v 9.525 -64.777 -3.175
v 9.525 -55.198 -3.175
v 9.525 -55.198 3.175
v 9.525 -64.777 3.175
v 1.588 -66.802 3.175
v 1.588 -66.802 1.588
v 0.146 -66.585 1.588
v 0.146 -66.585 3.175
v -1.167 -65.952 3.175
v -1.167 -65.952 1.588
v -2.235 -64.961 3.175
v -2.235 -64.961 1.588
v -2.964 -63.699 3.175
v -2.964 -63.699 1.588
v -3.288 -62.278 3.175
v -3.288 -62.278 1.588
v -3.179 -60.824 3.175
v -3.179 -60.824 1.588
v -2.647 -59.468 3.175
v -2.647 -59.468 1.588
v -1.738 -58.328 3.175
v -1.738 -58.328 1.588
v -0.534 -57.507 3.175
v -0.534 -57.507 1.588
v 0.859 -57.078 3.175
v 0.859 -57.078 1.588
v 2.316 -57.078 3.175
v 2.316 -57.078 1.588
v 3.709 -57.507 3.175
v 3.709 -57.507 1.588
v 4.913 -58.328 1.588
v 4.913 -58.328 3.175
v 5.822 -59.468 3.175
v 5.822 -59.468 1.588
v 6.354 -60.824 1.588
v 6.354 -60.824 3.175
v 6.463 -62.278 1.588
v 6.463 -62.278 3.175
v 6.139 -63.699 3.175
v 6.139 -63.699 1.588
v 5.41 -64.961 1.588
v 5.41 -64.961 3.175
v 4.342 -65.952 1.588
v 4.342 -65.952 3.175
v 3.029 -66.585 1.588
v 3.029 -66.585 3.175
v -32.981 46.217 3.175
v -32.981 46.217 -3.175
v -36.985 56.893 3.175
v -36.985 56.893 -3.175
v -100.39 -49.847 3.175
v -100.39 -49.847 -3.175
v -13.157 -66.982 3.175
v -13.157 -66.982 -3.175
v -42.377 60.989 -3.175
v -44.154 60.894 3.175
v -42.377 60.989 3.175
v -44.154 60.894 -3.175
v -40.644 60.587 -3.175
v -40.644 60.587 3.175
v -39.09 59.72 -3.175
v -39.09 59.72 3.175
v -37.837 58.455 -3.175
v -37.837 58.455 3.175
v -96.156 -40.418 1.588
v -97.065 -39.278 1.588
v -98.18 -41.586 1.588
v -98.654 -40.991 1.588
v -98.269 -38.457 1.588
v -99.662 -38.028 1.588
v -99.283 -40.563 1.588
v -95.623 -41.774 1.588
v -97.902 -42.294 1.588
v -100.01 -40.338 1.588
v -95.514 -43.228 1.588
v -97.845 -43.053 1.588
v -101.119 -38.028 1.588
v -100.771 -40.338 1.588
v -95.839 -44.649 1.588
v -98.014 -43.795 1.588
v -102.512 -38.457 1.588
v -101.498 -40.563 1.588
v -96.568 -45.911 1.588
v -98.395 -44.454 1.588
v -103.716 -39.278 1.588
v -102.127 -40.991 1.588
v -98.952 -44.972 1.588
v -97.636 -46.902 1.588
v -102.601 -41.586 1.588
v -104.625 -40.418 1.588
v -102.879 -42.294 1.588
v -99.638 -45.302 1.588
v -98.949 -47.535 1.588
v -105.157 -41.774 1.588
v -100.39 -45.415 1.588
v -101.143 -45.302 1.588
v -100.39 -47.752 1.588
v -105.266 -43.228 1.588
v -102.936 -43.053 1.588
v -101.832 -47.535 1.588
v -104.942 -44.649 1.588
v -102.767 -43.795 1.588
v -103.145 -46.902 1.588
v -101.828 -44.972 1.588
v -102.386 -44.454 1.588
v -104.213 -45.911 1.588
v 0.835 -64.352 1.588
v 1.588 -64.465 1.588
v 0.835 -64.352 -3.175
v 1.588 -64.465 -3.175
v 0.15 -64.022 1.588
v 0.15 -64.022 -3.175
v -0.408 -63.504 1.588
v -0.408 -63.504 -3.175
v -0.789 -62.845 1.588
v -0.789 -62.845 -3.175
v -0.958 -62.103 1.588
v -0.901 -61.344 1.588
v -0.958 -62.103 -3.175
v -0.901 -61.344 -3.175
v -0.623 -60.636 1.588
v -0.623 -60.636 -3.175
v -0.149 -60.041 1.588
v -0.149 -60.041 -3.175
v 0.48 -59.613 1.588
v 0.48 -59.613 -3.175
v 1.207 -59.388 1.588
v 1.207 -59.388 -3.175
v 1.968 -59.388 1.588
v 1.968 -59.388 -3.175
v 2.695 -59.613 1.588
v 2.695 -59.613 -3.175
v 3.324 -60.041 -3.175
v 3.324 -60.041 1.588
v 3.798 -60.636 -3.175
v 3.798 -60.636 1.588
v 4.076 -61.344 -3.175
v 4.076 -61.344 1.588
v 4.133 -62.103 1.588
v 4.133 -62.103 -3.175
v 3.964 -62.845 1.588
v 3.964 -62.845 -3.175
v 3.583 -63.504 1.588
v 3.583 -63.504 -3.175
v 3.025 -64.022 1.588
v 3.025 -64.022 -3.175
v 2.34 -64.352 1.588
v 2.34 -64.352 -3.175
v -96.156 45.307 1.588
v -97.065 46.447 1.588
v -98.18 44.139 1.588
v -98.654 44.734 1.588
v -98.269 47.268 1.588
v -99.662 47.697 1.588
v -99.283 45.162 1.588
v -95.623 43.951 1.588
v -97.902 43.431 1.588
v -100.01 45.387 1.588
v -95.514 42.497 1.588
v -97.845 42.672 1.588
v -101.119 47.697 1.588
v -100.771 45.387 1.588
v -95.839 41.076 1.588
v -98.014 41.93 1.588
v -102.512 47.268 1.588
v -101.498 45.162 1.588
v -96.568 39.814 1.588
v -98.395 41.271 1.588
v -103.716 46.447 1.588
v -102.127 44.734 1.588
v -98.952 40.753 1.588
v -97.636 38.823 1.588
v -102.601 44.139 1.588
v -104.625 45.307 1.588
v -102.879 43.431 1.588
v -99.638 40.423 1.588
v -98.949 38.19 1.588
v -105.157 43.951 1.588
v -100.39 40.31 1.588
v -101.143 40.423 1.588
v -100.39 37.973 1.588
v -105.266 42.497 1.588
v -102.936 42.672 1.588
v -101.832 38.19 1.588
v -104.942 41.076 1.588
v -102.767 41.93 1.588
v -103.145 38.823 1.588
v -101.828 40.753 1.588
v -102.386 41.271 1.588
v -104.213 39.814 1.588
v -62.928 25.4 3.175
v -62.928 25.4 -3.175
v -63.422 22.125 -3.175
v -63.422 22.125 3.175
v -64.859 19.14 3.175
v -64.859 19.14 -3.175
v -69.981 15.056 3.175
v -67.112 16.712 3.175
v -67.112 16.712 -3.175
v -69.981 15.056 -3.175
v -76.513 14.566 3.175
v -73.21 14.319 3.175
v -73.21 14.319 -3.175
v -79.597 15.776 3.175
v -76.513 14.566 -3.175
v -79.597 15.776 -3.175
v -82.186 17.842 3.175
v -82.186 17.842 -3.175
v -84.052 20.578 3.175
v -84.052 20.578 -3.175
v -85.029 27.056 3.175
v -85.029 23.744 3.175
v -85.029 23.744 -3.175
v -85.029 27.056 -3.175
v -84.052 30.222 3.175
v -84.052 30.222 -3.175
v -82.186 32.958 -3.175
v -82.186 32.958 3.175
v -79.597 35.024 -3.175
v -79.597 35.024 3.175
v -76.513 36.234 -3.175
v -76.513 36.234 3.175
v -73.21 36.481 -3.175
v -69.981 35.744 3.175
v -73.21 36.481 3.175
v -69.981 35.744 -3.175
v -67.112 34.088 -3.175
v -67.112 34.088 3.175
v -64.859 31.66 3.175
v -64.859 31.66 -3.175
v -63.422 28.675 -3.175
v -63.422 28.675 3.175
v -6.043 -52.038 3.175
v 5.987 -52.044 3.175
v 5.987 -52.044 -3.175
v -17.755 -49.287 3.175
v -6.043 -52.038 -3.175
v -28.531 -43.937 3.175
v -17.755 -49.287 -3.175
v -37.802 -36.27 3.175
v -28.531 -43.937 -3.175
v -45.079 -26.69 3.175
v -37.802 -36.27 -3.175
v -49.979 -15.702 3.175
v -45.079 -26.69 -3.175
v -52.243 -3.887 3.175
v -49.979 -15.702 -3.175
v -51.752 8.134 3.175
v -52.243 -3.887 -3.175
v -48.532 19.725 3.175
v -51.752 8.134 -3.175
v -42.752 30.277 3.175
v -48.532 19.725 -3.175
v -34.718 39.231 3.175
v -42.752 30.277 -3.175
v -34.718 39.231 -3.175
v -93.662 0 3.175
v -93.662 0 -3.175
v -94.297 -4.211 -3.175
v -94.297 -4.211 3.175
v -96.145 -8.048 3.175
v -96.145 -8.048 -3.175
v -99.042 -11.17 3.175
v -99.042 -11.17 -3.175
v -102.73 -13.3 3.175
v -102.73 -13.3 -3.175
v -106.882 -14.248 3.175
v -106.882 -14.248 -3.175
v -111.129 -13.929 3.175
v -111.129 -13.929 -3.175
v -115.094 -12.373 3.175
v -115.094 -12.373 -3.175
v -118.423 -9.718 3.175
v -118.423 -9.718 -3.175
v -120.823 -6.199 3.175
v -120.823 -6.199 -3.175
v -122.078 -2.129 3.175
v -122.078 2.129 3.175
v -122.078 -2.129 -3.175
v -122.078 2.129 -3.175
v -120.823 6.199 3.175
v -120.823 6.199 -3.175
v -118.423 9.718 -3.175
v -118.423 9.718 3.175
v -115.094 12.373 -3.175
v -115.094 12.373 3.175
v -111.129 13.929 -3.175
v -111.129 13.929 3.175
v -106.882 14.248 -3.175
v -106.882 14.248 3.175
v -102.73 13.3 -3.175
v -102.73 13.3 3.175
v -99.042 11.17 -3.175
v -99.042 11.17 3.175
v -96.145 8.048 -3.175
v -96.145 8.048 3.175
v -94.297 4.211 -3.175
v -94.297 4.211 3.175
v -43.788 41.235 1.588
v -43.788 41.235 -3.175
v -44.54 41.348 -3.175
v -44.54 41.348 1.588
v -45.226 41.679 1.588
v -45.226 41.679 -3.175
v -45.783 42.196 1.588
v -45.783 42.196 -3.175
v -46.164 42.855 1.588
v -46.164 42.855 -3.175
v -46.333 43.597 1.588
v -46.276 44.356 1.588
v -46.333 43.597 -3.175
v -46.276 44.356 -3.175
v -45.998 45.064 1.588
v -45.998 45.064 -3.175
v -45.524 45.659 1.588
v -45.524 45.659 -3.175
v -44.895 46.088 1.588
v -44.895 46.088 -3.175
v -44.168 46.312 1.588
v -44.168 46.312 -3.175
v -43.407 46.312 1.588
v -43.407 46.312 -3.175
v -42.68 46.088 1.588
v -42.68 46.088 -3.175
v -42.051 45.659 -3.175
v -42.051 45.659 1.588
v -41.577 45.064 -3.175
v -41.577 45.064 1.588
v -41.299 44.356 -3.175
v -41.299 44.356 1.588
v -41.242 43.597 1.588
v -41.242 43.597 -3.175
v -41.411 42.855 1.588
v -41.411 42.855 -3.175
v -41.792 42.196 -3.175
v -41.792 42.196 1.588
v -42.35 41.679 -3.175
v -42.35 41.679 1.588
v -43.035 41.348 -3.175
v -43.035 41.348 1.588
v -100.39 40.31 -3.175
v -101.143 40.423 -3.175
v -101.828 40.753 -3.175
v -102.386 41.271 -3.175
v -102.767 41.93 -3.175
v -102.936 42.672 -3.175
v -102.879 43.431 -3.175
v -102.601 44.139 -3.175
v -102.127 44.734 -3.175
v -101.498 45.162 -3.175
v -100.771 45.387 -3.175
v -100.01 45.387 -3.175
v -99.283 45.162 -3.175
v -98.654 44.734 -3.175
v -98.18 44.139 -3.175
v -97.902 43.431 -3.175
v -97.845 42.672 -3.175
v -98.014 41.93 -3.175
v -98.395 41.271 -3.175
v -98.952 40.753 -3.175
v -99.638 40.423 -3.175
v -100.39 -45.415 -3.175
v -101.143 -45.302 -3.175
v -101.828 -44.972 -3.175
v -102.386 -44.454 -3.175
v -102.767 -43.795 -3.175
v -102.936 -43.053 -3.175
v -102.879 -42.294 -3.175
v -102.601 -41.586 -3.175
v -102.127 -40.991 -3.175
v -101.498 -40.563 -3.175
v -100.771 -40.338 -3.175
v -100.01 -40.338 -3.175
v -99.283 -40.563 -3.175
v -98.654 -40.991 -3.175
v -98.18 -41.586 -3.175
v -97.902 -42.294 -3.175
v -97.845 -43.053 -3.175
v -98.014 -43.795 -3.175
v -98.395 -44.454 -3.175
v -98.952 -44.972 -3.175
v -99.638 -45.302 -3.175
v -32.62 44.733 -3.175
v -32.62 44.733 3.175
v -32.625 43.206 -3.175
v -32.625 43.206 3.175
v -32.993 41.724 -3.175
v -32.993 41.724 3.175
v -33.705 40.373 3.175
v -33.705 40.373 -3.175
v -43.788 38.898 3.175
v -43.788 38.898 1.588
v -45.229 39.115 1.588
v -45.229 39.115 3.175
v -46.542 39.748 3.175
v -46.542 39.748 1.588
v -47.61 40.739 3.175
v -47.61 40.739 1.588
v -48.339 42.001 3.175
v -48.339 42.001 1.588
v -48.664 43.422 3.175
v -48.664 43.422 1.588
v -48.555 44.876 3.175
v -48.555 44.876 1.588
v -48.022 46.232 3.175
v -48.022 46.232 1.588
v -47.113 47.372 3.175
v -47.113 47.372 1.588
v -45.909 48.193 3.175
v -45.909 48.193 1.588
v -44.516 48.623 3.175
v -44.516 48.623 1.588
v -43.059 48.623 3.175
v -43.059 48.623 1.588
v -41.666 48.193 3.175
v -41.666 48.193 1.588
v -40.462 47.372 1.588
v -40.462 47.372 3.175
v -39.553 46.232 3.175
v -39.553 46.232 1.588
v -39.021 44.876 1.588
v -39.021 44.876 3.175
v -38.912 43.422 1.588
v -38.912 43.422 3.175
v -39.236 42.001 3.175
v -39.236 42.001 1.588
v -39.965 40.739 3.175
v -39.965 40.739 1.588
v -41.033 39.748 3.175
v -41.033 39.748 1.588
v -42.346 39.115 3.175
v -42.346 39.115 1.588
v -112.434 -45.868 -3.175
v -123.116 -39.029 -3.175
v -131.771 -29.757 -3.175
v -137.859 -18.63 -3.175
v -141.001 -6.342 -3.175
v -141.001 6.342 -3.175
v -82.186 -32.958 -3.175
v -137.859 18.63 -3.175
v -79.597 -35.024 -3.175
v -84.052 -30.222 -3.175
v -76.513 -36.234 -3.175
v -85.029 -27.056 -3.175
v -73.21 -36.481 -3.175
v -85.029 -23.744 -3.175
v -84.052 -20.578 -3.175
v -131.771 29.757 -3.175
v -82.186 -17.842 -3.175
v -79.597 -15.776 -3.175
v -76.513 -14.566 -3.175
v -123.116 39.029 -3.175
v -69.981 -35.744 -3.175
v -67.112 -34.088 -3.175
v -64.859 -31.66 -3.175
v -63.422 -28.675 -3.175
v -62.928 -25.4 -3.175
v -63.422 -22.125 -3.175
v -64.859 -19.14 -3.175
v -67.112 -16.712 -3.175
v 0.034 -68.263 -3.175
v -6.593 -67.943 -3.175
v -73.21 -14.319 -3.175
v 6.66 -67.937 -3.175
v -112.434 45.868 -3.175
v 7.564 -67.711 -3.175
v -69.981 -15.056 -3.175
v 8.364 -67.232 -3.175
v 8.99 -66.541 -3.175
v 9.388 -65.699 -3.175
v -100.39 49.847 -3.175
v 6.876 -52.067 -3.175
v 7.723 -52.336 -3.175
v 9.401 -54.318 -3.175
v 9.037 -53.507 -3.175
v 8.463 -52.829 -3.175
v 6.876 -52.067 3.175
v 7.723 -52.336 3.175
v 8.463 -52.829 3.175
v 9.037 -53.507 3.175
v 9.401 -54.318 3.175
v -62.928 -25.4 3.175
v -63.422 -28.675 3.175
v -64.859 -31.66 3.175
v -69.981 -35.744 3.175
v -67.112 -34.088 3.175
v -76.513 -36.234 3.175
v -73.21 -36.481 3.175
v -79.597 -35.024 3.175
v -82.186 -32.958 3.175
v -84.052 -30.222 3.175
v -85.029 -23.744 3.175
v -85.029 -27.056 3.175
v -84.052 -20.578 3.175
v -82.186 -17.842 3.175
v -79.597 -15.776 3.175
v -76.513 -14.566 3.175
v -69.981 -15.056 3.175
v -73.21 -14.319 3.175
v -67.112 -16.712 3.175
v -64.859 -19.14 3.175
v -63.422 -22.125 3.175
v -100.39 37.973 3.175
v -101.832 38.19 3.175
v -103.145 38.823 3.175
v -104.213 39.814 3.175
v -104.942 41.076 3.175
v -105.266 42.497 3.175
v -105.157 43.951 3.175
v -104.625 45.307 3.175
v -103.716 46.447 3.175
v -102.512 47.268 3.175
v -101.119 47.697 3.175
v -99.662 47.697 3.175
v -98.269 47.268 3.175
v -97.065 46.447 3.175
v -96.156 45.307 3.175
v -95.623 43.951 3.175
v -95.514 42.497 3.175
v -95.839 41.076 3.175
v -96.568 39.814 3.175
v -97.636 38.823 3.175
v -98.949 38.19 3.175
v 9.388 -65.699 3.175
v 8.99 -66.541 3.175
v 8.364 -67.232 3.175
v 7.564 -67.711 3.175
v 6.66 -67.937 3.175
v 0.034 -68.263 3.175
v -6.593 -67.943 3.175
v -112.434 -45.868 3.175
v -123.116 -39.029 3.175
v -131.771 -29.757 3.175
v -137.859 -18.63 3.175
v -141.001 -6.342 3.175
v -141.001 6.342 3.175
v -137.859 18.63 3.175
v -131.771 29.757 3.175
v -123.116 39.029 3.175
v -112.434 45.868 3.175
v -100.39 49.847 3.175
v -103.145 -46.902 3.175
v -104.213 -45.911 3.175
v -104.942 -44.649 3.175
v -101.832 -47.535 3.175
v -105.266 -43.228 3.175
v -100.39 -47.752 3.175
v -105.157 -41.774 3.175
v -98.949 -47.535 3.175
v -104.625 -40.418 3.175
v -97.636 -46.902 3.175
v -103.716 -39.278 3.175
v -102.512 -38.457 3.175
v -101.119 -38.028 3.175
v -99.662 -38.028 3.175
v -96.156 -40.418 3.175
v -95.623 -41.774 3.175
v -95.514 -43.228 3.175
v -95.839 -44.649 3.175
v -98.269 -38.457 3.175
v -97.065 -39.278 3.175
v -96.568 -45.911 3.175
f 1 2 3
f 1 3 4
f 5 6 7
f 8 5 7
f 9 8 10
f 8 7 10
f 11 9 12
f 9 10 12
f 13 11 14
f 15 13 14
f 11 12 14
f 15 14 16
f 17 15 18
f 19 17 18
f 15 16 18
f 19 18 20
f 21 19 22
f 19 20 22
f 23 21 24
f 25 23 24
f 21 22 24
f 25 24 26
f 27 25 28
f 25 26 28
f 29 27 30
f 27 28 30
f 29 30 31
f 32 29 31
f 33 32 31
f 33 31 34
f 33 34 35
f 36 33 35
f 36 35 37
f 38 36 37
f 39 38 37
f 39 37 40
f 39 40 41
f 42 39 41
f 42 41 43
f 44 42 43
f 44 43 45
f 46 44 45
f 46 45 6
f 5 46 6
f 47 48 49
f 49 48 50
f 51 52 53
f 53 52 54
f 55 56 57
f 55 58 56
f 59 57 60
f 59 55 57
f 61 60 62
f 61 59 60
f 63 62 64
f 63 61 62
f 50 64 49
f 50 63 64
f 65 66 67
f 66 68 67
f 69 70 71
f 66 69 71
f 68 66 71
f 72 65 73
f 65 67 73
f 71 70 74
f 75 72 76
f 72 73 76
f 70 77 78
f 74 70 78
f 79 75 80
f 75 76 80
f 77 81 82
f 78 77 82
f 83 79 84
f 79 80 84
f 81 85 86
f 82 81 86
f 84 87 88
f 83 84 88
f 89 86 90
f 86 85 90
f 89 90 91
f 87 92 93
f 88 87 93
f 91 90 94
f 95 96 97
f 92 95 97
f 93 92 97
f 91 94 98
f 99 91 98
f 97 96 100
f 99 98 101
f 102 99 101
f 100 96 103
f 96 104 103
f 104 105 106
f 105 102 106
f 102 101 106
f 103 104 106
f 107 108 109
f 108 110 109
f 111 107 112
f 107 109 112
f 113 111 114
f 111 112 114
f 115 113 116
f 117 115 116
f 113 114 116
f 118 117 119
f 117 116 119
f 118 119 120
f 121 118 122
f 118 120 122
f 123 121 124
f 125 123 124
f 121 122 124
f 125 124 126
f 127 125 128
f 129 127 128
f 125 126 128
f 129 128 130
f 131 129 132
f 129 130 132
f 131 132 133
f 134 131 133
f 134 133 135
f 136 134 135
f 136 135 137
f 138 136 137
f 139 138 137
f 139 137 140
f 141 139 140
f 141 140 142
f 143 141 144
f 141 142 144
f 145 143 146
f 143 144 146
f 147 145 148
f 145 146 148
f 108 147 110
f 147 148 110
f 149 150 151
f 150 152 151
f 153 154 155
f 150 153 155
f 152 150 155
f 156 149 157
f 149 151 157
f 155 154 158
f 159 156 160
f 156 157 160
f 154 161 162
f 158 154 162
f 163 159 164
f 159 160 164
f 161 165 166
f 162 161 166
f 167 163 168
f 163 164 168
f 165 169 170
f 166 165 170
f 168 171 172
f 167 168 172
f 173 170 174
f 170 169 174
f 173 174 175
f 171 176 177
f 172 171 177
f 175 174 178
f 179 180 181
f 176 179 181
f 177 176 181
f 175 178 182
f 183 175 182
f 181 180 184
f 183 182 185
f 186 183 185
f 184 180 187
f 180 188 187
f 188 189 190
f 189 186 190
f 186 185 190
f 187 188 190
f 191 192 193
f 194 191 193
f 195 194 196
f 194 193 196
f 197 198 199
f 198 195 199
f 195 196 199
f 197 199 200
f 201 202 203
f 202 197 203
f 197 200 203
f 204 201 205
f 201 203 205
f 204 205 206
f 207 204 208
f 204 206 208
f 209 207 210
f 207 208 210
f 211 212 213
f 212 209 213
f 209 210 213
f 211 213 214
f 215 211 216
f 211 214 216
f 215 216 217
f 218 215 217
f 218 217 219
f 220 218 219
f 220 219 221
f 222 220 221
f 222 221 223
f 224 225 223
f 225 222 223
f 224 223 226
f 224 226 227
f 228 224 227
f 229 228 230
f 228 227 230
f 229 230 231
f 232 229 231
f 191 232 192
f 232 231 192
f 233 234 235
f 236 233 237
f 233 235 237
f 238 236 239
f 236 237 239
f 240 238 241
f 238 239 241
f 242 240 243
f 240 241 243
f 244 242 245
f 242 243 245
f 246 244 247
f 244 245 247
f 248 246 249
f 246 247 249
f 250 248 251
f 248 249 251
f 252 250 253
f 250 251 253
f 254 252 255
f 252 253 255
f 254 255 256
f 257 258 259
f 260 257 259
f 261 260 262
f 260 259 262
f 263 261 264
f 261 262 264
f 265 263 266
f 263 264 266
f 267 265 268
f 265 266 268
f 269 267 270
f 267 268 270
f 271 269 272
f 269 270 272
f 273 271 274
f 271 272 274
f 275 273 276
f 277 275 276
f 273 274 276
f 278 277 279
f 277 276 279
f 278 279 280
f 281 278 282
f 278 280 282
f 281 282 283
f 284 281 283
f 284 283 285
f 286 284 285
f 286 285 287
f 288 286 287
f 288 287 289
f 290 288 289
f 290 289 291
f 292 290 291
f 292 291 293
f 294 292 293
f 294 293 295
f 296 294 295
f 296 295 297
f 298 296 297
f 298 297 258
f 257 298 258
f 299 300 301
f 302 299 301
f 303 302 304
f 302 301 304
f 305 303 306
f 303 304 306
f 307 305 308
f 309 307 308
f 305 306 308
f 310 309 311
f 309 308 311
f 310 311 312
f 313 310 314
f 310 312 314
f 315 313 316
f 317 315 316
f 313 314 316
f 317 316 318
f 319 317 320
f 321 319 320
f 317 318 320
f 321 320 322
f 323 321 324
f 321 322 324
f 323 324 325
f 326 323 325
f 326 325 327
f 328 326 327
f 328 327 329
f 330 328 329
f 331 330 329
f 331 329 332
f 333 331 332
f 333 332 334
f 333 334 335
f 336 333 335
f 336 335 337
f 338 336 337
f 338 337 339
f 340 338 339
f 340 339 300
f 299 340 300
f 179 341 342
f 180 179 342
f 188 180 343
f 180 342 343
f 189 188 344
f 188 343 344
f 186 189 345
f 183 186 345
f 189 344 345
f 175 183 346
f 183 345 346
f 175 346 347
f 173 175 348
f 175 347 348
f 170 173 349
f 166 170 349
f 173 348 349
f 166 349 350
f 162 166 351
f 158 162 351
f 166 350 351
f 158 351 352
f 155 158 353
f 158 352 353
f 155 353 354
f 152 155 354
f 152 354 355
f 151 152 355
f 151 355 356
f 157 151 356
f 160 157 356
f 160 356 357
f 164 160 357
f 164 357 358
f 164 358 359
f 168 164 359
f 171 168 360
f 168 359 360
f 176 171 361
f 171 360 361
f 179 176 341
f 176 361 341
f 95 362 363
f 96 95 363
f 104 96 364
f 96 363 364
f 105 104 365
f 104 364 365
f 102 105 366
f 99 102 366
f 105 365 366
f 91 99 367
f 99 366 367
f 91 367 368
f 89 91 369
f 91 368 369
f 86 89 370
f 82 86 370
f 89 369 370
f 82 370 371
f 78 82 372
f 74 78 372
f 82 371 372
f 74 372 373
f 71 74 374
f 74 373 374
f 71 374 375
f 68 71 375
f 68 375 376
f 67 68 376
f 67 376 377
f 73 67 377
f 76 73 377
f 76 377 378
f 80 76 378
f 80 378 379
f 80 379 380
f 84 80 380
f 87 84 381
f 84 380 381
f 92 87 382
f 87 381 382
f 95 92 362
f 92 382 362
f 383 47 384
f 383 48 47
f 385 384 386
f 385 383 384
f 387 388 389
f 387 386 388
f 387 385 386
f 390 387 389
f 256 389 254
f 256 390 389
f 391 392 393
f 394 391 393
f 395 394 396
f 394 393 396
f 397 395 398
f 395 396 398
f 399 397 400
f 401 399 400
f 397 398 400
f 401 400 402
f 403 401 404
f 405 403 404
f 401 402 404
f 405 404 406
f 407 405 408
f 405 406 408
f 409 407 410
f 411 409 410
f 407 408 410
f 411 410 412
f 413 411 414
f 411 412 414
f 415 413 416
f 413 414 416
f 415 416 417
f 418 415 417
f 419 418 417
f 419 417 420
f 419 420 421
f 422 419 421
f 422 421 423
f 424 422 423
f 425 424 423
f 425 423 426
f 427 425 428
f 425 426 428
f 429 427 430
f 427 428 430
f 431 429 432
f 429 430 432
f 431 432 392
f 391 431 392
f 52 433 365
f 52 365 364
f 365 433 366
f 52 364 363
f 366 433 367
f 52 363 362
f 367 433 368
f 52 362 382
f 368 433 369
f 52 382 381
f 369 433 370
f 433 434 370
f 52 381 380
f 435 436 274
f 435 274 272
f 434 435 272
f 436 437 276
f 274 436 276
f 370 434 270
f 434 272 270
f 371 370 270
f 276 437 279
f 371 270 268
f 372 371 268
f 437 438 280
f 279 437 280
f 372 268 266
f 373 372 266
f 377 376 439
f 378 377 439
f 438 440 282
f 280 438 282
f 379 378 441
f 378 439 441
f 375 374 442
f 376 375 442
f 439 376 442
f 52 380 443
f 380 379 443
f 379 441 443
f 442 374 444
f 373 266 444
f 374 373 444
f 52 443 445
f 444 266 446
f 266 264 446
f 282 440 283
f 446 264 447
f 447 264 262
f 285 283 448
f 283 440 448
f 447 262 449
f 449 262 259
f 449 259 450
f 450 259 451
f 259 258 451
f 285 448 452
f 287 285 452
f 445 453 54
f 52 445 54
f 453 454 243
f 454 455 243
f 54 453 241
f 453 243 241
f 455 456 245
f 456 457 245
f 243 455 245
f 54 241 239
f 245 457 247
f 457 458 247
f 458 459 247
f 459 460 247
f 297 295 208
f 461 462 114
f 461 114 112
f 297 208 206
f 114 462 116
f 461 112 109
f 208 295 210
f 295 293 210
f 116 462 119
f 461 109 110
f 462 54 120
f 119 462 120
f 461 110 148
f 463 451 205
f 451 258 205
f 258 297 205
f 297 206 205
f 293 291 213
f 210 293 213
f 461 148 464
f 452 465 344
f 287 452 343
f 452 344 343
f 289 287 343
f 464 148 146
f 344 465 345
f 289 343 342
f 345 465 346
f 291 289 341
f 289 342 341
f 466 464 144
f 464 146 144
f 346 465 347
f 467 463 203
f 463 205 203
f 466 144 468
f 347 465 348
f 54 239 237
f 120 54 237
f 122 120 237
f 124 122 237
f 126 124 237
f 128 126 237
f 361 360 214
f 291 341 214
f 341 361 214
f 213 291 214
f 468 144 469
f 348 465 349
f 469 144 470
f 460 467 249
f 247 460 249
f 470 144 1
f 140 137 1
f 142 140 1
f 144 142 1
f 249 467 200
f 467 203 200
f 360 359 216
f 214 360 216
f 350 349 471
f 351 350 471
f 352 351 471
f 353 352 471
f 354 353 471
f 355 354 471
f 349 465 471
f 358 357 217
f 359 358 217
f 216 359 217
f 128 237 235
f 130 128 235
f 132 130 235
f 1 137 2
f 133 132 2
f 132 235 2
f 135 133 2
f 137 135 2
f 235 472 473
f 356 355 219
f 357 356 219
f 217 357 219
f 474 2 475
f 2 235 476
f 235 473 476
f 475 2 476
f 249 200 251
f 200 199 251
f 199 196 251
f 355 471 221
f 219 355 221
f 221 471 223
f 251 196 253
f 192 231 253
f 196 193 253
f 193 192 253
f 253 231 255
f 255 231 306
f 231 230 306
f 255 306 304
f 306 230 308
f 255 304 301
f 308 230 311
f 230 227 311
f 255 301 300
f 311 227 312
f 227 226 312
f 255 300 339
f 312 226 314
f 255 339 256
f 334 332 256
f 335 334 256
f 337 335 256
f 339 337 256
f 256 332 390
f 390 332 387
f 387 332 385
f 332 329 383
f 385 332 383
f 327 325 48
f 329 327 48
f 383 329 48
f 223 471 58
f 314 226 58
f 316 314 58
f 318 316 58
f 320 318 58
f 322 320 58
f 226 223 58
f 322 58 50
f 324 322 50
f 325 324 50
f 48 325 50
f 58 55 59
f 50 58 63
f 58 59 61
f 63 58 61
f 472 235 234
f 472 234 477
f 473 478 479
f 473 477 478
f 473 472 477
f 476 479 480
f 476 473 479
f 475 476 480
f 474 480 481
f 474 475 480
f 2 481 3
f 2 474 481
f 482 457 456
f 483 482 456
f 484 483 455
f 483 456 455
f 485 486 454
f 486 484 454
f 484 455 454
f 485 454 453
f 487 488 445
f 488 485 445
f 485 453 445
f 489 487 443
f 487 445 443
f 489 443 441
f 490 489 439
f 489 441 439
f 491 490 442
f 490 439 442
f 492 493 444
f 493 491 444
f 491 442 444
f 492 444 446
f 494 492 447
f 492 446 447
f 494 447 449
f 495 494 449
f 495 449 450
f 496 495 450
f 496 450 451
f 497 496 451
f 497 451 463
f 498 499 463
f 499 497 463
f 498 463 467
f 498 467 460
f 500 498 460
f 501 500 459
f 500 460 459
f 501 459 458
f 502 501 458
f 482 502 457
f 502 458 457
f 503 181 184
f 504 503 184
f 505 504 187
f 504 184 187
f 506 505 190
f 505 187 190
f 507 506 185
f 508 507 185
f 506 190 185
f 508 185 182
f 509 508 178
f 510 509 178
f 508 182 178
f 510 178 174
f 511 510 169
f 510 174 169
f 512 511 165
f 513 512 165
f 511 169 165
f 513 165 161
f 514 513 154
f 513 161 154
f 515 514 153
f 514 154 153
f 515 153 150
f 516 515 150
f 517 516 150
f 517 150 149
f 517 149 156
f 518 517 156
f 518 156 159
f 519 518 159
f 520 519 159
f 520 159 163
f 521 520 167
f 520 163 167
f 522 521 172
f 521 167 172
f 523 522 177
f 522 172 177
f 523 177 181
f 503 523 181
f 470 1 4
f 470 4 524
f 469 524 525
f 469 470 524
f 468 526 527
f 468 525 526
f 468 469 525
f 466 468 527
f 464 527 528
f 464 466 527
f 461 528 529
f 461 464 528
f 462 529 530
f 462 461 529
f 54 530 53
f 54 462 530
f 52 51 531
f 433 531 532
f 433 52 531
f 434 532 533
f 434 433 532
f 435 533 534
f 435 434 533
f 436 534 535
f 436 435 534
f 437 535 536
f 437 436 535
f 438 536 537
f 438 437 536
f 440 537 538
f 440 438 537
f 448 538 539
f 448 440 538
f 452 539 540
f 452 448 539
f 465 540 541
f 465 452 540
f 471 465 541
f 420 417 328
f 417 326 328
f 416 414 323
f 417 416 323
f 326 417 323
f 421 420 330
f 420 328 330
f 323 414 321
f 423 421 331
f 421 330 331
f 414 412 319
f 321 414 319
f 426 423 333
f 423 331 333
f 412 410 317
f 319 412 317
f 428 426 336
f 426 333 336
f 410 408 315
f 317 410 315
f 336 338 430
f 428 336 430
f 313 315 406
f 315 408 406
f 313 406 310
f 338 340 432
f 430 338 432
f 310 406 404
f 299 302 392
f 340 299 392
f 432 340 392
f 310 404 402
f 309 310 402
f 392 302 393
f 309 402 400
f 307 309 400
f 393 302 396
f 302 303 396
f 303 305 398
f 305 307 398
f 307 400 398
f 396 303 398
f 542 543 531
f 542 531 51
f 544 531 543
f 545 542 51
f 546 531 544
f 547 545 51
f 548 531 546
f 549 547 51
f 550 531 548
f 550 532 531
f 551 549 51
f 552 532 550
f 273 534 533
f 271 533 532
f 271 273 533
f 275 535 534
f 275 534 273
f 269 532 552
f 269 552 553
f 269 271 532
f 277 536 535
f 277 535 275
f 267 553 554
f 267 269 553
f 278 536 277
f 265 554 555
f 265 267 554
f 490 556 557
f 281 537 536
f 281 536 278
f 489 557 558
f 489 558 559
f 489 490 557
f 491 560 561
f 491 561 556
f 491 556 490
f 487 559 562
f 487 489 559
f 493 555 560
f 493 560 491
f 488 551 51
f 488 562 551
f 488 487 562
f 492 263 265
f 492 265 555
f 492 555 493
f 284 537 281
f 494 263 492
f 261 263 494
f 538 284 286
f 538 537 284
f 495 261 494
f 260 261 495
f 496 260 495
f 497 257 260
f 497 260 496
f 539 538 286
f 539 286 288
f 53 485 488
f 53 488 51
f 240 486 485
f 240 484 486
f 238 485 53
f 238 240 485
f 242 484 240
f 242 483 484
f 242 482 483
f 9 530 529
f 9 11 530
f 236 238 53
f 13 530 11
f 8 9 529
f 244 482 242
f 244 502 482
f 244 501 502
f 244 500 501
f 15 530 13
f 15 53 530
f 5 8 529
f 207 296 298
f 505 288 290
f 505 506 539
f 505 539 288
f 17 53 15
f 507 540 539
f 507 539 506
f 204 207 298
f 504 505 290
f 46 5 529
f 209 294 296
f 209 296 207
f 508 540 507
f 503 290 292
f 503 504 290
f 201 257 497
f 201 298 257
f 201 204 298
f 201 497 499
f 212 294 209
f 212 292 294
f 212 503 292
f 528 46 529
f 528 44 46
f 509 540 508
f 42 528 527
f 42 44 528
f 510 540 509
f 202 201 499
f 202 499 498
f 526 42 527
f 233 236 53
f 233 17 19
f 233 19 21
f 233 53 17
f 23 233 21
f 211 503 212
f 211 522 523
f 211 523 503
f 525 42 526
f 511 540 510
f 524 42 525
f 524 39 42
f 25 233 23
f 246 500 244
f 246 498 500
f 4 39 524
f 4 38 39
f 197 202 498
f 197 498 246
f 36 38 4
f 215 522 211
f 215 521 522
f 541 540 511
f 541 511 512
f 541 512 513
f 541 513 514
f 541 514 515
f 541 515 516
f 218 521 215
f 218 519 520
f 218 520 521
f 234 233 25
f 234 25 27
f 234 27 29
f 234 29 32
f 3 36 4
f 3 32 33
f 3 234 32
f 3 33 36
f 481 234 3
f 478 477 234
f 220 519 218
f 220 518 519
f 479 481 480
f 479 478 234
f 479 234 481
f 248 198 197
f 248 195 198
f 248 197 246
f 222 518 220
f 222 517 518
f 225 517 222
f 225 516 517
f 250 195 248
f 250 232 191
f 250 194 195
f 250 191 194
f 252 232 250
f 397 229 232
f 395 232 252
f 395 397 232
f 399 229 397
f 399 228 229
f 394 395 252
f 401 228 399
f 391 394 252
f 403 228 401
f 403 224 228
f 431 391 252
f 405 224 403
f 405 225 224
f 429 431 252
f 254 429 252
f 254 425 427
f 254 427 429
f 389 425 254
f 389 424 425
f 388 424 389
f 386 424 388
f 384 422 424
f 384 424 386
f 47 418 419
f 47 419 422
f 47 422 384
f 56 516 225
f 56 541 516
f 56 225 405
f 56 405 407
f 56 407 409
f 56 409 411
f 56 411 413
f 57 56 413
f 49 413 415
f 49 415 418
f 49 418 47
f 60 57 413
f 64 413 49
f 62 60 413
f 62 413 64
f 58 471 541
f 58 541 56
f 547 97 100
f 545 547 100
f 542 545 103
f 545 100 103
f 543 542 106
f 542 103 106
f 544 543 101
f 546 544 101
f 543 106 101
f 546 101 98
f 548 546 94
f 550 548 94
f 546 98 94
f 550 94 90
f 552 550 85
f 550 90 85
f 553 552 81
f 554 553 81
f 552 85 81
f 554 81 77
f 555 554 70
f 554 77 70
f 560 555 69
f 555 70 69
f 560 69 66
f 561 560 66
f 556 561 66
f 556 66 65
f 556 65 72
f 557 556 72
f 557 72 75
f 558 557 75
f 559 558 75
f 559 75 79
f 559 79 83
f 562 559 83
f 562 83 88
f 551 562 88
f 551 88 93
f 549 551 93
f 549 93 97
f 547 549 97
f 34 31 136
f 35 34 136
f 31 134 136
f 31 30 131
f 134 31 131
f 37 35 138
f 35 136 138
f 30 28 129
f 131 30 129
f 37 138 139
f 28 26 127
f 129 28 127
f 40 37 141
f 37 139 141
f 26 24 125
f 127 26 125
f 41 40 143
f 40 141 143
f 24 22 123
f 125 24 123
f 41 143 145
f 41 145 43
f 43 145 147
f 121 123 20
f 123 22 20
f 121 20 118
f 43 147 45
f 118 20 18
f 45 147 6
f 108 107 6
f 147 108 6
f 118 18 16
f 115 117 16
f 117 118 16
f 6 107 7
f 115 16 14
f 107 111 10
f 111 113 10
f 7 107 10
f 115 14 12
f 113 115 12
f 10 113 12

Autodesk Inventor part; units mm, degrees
ref_plane "YZ Plane" through (0, 0, 0) normal (1, 0, 0) x (0, 1, 0)
ref_plane "XZ Plane" through (0, 0, 0) normal (0, 1, 0) x (-1, 0, 0)
ref_plane "XY Plane" through (0, 0, 0) normal (0, 0, 1) x (1, 0, 0)
sketch "Sketch1" plane through (0, 0, 0) normal (0, 0, 1) x (1, 0, 0)
  circle A0 centre (0, 0) radius 50.8 construction
  arc A1 (-100.3903, 49.8474) -> (-100.3903, -49.8474) centre (-90.5988, 0) ccw
  line L0 (-100.3903, 49.8474) -> (-44.1544, 60.8938)
  line L1 (-100.3903, -49.8474) -> (-13.1573, -66.9825)
  circle A2 centre (-74.0404, 25.4) radius 11.1125
  circle A3 centre (-74.0404, -25.4) radius 11.1125
  line L2 (-179.8386, 0) -> (89.2398, 0) projected
  line L3 (0, -95.9117) -> (0, 94.8458) projected
  line L4 (9.525, -55.1985) -> (9.525, -64.777)
  arc A4 (-13.1573, -66.9825) -> (6.6598, -67.9369) centre (0, 0) ccw
  arc A5 (-34.7181, 39.2314) -> (5.9871, -52.0443) centre (0, 0) ccw
  arc A6 (9.525, -55.1985) -> (5.9871, -52.0443) centre (6.35, -55.1985) ccw
  arc A7 (6.6598, -67.9369) -> (9.525, -64.777) centre (6.35, -64.777) ccw
  circle A8 centre (-107.95, 0) radius 14.2875
  line L5 (-107.95, -14.2875) -> (-107.95, 14.2875) construction
  line L6 (0, 0) -> (-43.7877, 43.7877) construction
  line L7 (-32.9808, 46.2166) -> (-36.9849, 56.8928)
  arc A9 (-36.9849, 56.8928) -> (-44.1544, 60.8938) centre (-42.9305, 54.6628) ccw
  arc A10 (-34.7181, 39.2314) -> (-32.9808, 46.2166) centre (-38.9264, 43.9867) ccw
  point P0 (-38.8745, 61.9309)
  point P1 (9.525, 51.5143)
  point P2 (9.525, 67.5947)
  point P3 (9.525, -51.5143)
  point P4 (9.525, -67.5947)
  point P5 (0, 52.3875)
  point P6 (-31.3803, 41.9491)
  dimension "d0" = 101.6
  dimension "d9" = 22.225
  dimension "d13" = 1.5875
  dimension "d16" = 15.875
  dimension "d28" = 50.8
  dimension "d38" = 28.575
  dimension "d39" = 107.95
  dimension "d40" = 45
  dimension "d41" = 61.9252
  dimension "d51" = 6.35
extrude "Extrusion1" add sketch "Sketch1" along normal mid plane 6.35 contours L0 A9 L7 A10 A5 L2 A8 A1 | L2 A8 A5 L3 A4 L1 A1 | L3 A5 A6 L4 A7 A4
sketch "Sketch2" plane through (0, 0, 3.175) normal (0, 0, 1) x (1, 0, 0)
  line L0 (-171.5836, 0) -> (39.7098, 0) projected
  line L1 (0, -94.2975) -> (0, 87.9475) projected
  point P0 (1.5875, 61.9125)
  point P1 (1.5875, -61.9125)
  dimension "d19" = 1.5875
  dimension "d20" = 61.9125
hole "Hole1" at (1.5875, 61.9125, 3.175) at (1.5875, -61.9125, 3.175) direction (0, 0, -1) diameter 5.1054 end through all counterbore diameter 9.779 counterbore depth 1.5875 clearance for "Flat Head Machine Screw (82)" size "#10" standard "Ansi Unified Screw Threads"
sketch "Sketch3" plane through (0, 0, 3.175) normal (0, 0, 1) x (1, 0, 0)
  line L0 (9.525, 64.777) -> (9.525, 55.1985) projected
  line L1 (-100.3903, -49.8474) -> (-100.3903, 49.8474) construction
  line L2 (-171.5836, 0) -> (39.7098, 0) projected
  line L3 (0, -94.8704) -> (0, 91.3849) projected
  point P0 (-100.3903, 42.8625)
  point P1 (-100.3903, -42.8625)
  dimension "d29" = 42.8625
hole "Hole2" at (-100.3903, 42.8625, 3.175) at (-100.3903, -42.8625, 3.175) direction (0, 0, -1) diameter 5.1054 end through all counterbore diameter 9.779 counterbore depth 1.5875 clearance for "Flat Head Machine Screw (82)" size "#10" standard "Ansi Unified Screw Threads"
sketch "Sketch4" plane through (0, 0, 3.175) normal (0, 0, 1) x (1, 0, 0)
  arc A0 (-34.7181, 39.2314) -> (5.9871, -52.0443) centre (0, 0) ccw projected
  line L0 (0, 0) -> (-43.7877, 43.7877) construction
  line L1 (-171.5836, 0) -> (39.7098, 0) projected
  line L2 (0, -94.1176) -> (0, 86.8679) projected
  point P0 (5.9871, 52.0443)
  dimension "d42" = 61.9252
  dimension "d43" = 45
hole "Hole3" at (-43.7877, 43.7877, 3.175) direction (0, 0, -1) diameter 5.1054 end through all counterbore diameter 9.779 counterbore depth 1.5875 clearance for "Flat Head Machine Screw (82)" size "#10" standard "Ansi Unified Screw Threads"
properties part number "connected plate"
